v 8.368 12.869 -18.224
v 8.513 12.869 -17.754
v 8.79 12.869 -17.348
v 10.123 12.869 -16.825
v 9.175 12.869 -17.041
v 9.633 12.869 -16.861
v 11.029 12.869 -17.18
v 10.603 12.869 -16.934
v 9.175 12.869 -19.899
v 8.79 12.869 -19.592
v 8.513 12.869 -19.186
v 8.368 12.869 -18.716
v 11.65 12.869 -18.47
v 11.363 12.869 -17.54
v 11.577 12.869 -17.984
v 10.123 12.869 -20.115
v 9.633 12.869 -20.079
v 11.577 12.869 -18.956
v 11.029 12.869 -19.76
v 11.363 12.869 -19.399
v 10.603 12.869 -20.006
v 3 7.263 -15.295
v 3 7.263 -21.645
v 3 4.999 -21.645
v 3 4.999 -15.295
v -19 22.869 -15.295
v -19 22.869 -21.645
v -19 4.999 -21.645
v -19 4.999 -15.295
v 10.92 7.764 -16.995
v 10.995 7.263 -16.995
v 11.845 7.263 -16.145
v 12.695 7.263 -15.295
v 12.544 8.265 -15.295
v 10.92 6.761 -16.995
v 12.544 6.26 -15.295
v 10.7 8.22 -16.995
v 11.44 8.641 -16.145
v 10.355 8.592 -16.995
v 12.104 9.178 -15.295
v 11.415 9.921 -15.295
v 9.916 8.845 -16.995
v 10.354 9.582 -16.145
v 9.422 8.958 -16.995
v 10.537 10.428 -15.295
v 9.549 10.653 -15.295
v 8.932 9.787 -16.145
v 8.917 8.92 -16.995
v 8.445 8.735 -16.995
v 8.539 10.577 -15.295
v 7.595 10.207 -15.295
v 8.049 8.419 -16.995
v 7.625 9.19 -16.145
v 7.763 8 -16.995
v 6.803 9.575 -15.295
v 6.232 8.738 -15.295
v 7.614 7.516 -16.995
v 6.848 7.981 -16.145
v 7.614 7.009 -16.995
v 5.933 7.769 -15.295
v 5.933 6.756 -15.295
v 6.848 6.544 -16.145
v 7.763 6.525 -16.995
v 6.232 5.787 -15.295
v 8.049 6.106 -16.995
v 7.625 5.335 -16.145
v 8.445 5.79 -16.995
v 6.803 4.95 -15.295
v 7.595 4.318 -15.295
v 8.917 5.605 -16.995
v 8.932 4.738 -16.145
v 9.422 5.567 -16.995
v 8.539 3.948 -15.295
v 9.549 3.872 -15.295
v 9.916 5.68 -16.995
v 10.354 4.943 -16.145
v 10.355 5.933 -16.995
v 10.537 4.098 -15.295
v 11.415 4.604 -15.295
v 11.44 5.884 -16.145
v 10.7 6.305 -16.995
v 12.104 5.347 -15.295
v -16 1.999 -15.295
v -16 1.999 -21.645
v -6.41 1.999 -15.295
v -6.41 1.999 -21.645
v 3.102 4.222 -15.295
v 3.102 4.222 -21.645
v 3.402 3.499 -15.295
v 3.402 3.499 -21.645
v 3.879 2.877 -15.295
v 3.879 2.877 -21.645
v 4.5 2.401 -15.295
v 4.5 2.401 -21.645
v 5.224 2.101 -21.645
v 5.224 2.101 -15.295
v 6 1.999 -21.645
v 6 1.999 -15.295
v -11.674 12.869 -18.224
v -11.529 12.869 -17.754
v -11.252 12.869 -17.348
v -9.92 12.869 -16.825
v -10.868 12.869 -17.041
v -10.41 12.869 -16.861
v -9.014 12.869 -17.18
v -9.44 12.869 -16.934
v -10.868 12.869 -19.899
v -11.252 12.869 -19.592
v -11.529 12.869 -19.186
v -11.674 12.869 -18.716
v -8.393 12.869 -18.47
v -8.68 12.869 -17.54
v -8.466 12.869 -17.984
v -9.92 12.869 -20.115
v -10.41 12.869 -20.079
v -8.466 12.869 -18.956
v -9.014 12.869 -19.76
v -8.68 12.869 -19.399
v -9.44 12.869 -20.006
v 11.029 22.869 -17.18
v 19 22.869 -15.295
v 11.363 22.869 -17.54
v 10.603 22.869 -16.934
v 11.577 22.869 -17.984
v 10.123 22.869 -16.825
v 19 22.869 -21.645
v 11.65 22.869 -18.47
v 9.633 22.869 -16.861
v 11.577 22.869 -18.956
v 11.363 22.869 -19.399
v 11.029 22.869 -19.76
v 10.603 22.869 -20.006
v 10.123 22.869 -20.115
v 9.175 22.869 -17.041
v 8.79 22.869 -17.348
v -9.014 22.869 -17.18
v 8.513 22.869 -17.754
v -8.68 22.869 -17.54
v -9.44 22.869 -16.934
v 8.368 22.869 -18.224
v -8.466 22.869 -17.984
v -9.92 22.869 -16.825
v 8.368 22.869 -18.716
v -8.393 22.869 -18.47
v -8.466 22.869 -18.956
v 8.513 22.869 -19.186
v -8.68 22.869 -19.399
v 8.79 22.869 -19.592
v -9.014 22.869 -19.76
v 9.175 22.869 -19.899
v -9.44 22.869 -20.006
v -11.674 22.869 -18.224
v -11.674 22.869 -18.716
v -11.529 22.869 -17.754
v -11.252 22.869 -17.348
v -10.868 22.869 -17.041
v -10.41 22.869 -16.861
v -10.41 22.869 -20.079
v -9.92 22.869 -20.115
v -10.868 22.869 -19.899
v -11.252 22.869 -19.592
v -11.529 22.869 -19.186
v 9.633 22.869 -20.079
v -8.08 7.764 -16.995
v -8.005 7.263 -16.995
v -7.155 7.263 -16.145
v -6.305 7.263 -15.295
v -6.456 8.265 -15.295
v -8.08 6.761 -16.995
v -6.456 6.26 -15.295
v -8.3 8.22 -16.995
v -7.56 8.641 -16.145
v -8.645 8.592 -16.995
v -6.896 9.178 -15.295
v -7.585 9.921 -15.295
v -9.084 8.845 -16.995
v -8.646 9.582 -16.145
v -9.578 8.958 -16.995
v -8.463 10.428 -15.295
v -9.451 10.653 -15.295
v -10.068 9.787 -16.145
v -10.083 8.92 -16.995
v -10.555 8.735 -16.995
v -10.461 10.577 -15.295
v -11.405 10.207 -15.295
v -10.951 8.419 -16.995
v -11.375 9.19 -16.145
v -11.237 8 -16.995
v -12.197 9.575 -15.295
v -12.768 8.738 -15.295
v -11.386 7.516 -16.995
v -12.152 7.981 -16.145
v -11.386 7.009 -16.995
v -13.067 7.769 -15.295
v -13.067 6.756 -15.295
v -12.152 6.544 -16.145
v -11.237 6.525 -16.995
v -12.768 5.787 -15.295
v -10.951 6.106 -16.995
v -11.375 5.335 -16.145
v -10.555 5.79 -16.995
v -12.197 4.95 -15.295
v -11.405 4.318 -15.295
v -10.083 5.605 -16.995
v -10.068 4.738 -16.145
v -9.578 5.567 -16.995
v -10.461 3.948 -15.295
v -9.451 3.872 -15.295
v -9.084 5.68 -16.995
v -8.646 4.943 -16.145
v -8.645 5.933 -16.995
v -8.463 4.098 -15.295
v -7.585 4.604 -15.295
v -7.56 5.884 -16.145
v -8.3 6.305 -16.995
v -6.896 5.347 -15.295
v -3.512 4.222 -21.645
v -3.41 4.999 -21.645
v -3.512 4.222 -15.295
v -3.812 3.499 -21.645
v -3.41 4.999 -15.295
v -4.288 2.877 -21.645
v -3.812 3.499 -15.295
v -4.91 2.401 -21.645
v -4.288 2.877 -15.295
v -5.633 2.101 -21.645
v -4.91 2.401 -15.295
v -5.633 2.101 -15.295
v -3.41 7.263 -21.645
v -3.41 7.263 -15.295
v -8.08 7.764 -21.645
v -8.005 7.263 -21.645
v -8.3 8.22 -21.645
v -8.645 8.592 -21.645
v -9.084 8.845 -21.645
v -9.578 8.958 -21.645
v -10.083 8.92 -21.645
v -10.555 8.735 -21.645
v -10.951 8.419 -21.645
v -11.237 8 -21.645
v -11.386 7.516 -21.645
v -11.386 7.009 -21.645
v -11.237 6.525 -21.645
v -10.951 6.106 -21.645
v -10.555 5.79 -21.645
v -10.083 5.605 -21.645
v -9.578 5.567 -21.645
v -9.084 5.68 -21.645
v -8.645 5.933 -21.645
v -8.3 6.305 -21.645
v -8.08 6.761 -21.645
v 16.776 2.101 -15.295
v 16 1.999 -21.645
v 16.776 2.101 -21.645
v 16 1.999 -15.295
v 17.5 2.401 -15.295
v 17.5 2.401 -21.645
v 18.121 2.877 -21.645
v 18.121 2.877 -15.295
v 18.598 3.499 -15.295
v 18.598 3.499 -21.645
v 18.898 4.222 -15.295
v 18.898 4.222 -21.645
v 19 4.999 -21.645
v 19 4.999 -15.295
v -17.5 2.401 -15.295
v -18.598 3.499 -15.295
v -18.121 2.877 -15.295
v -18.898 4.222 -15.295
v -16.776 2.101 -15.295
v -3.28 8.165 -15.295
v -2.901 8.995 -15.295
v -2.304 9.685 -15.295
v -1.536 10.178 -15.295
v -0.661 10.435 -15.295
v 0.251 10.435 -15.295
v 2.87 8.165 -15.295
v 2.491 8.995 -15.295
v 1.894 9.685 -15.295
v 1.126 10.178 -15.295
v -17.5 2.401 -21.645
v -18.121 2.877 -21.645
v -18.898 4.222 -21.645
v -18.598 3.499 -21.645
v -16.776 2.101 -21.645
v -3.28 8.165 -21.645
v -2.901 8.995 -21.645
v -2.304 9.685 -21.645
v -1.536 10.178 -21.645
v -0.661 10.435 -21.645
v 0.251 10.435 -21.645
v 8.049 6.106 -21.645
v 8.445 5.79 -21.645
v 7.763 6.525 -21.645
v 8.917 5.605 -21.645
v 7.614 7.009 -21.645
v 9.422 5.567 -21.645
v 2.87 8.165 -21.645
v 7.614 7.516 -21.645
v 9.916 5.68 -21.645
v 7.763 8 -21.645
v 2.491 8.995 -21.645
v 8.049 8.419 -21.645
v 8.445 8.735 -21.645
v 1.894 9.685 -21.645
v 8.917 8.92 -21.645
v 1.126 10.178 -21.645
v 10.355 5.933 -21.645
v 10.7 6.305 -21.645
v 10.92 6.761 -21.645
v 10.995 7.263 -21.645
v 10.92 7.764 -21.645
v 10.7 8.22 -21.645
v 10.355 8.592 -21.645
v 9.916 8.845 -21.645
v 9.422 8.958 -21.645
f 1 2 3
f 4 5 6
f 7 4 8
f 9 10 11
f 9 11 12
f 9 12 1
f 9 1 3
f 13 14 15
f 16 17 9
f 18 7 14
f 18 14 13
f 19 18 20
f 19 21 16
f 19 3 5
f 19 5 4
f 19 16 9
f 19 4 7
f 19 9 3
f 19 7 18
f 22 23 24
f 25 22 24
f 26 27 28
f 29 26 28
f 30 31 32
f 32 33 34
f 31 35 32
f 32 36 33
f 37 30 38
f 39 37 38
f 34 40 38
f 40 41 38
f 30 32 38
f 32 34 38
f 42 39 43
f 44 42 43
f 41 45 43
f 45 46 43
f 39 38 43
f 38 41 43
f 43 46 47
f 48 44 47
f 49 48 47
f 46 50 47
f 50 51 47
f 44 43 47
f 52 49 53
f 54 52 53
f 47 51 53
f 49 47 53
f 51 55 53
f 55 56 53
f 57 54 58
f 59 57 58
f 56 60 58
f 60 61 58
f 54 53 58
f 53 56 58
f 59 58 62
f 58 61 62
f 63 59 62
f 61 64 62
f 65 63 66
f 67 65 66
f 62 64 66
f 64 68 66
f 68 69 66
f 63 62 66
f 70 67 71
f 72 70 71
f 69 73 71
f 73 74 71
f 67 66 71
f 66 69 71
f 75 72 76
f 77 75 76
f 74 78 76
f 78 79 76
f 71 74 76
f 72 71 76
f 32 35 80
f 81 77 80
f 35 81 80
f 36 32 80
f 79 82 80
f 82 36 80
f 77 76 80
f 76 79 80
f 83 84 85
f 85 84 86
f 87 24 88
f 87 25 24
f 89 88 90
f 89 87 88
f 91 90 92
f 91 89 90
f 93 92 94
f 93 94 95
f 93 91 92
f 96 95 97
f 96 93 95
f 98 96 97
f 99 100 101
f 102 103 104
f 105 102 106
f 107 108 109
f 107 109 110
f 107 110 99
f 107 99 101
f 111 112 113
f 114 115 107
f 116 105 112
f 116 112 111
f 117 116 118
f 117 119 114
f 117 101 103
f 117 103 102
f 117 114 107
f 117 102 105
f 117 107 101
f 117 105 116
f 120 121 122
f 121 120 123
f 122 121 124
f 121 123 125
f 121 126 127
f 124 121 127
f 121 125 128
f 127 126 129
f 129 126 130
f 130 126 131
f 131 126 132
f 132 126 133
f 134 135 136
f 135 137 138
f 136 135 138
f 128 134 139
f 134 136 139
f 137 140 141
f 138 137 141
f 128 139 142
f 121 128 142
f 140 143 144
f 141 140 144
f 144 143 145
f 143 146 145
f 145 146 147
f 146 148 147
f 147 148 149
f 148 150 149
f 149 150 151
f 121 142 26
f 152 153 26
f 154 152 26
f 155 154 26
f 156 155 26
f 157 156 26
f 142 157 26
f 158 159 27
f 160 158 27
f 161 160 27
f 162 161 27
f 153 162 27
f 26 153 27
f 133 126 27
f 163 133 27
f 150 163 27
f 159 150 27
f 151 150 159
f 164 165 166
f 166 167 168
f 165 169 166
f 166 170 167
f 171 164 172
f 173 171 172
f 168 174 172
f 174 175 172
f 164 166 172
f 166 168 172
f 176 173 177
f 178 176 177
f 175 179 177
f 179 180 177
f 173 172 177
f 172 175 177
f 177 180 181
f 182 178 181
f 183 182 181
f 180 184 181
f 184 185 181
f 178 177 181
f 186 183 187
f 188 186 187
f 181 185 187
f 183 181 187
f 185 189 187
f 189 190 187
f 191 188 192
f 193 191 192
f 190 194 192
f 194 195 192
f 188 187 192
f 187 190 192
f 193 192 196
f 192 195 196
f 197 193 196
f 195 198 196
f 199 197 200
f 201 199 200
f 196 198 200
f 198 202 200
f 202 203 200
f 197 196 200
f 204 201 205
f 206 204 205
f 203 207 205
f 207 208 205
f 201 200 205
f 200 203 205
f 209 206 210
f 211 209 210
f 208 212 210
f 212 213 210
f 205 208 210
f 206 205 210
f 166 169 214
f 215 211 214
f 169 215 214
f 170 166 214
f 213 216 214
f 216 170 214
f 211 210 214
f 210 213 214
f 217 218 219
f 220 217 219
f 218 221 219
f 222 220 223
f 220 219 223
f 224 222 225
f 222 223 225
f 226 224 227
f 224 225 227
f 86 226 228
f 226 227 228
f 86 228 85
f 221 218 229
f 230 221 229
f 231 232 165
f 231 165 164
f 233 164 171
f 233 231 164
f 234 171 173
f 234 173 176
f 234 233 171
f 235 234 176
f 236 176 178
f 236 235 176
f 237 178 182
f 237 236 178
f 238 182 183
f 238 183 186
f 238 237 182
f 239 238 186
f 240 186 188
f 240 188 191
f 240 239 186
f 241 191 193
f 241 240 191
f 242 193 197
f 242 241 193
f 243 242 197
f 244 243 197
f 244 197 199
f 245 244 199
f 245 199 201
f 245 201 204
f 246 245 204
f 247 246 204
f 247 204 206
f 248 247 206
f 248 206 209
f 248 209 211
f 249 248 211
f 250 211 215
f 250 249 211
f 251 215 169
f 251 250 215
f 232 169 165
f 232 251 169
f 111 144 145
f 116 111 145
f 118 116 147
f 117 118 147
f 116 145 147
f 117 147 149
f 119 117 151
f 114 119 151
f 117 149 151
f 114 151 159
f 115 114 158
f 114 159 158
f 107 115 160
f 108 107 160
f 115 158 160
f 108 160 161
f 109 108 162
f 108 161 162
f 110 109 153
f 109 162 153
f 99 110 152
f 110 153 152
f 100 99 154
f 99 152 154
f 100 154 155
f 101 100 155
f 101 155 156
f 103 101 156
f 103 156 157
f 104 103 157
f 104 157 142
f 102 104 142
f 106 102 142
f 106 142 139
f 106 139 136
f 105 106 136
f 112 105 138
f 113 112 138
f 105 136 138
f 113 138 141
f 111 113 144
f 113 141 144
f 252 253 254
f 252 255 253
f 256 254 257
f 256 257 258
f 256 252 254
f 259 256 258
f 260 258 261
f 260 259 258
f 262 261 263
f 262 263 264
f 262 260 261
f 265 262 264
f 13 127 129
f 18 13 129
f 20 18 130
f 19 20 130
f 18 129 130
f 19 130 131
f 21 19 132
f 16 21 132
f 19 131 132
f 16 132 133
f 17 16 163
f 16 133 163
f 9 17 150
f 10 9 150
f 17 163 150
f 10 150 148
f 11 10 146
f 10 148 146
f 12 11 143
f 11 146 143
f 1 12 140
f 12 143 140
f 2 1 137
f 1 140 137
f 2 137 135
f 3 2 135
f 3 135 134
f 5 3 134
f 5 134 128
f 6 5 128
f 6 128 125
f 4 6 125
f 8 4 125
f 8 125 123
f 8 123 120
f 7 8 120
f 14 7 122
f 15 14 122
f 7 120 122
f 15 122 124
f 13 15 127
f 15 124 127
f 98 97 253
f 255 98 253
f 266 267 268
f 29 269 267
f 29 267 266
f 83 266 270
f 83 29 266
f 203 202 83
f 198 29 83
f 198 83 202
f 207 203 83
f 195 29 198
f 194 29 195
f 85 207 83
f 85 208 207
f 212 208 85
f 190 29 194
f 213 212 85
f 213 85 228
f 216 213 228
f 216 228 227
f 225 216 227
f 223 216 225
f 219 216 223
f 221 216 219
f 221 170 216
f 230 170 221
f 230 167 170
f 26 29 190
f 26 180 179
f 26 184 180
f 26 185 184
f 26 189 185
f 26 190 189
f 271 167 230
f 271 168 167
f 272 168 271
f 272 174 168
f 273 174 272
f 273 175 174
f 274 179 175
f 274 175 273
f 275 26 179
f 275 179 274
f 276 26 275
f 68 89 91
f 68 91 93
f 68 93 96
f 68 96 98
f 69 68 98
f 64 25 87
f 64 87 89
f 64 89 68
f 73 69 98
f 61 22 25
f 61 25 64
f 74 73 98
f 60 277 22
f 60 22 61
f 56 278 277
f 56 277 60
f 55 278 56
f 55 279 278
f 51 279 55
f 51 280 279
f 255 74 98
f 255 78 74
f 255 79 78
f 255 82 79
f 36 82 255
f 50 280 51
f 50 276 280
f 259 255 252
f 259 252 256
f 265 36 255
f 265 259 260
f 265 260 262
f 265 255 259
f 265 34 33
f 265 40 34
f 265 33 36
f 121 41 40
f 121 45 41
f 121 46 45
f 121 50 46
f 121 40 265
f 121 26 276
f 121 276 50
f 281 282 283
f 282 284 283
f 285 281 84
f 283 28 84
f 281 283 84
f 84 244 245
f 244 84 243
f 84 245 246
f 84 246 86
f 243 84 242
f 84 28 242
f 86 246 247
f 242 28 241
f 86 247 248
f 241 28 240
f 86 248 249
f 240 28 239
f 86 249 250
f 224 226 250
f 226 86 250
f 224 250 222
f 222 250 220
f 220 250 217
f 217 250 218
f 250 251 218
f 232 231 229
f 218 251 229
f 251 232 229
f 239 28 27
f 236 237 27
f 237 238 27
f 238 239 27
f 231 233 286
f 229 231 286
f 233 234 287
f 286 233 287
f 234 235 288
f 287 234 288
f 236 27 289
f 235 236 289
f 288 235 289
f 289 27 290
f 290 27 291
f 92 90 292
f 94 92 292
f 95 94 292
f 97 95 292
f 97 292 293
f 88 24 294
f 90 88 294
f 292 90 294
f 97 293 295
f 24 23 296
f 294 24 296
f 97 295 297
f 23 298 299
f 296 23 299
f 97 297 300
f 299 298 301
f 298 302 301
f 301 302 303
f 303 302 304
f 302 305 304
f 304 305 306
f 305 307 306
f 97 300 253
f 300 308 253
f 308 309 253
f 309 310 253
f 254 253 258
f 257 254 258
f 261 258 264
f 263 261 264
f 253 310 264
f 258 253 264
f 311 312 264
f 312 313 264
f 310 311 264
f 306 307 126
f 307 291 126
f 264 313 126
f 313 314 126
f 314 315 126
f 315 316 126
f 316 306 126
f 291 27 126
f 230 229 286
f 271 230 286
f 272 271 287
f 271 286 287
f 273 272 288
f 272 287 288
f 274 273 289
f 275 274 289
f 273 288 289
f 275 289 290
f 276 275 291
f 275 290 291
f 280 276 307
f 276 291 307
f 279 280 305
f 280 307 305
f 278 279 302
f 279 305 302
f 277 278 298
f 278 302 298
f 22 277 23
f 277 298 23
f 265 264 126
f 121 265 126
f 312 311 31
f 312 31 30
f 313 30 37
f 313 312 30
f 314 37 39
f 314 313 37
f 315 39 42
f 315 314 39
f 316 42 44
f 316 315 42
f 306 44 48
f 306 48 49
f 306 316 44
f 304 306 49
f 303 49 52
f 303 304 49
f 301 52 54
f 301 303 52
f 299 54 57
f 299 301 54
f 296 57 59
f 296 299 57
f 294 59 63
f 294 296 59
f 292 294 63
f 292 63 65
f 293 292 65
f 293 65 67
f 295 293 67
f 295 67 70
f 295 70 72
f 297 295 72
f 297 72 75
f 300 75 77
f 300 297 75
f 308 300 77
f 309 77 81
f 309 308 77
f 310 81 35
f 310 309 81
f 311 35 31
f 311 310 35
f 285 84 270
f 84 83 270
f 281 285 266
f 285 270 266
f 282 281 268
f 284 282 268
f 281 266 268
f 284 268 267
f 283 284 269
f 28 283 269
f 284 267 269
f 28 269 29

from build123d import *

# Parameters (mm, degrees)
SKETCH1_R           = 1.7
BOSS_EXTRUDE1_DEPTH = 6.35
CHAMFER1_SIZE       = 1.7
SKETCH2_R           = 1.65
CUT_EXTRUDE1_DEPTH  = 10
FILLET1_R           = 3


with BuildPart() as part:
    # Sketch1 → Boss-Extrude1 (new body)
    with BuildSketch(Plane(origin=(7.6e-08, 0, -21.644897171), x_dir=(1, 0, 4e-09), z_dir=(-4e-09, 0, 1))):
        with BuildLine():
            Line((3.000021754, 7.262533291), (3.000021754, 1.9987))
            Line((3.000021754, 1.9987), (19.00000025, 1.9987))
            Line((19.00000025, 1.9987), (19.00000025, 22.8687))
            Line((19.00000025, 22.8687), (-19.00000025, 22.8687))
            Line((-19.00000025, 22.8687), (-19.00000025, 1.9987))
            Line((-19.00000025, 1.9987), (-3.409734271, 1.9987))
            Line((-3.409734271, 1.9987), (-3.409734271, 7.262533291))
            ThreePointArc((-3.409734271, 7.262533291), (-0.204856259, 10.467411304), (3.000021754, 7.262533291))
        make_face()
        with Locations((9.295143741, 7.262533291)):
            Circle(SKETCH1_R, mode=Mode.SUBTRACT)
        with Locations((-9.704856259, 7.262533291)):
            Circle(SKETCH1_R, mode=Mode.SUBTRACT)
    extrude(amount=BOSS_EXTRUDE1_DEPTH)

    # Chamfer1
    chamfer1_edges = [part.edges().sort_by_distance(p)[0] for p in [
        (7.595143795, 7.262533291, -15.294897144),
        (-11.404856205, 7.262533291, -15.294897211),
    ]]
    chamfer(chamfer1_edges, length=CHAMFER1_SIZE)

    # Sketch2 → Cut-Extrude1 (cut)
    with BuildSketch(Plane(origin=(0, 22.8687, 0), x_dir=(1, 0, 0), z_dir=(0, 1, 0))):
        with Locations((10, 18.469897104)):
            Circle(SKETCH2_R)
        with Locations((-10.042850258, 18.469897104)):
            Circle(SKETCH2_R)
    extrude(amount=-CUT_EXTRUDE1_DEPTH, mode=Mode.SUBTRACT)

    # Fillet1
    fillet1_edges = [part.edges().sort_by_distance(p)[0] for p in [
        (-3.409734206, 1.9987, -18.469897183),
        (-19.000000186, 1.9987, -18.469897237),
        (19.000000315, 1.9987, -18.469897104),
        (3.000021818, 1.9987, -18.46989716),
    ]]
    fillet(fillet1_edges, radius=FILLET1_R)


solid = part.part
